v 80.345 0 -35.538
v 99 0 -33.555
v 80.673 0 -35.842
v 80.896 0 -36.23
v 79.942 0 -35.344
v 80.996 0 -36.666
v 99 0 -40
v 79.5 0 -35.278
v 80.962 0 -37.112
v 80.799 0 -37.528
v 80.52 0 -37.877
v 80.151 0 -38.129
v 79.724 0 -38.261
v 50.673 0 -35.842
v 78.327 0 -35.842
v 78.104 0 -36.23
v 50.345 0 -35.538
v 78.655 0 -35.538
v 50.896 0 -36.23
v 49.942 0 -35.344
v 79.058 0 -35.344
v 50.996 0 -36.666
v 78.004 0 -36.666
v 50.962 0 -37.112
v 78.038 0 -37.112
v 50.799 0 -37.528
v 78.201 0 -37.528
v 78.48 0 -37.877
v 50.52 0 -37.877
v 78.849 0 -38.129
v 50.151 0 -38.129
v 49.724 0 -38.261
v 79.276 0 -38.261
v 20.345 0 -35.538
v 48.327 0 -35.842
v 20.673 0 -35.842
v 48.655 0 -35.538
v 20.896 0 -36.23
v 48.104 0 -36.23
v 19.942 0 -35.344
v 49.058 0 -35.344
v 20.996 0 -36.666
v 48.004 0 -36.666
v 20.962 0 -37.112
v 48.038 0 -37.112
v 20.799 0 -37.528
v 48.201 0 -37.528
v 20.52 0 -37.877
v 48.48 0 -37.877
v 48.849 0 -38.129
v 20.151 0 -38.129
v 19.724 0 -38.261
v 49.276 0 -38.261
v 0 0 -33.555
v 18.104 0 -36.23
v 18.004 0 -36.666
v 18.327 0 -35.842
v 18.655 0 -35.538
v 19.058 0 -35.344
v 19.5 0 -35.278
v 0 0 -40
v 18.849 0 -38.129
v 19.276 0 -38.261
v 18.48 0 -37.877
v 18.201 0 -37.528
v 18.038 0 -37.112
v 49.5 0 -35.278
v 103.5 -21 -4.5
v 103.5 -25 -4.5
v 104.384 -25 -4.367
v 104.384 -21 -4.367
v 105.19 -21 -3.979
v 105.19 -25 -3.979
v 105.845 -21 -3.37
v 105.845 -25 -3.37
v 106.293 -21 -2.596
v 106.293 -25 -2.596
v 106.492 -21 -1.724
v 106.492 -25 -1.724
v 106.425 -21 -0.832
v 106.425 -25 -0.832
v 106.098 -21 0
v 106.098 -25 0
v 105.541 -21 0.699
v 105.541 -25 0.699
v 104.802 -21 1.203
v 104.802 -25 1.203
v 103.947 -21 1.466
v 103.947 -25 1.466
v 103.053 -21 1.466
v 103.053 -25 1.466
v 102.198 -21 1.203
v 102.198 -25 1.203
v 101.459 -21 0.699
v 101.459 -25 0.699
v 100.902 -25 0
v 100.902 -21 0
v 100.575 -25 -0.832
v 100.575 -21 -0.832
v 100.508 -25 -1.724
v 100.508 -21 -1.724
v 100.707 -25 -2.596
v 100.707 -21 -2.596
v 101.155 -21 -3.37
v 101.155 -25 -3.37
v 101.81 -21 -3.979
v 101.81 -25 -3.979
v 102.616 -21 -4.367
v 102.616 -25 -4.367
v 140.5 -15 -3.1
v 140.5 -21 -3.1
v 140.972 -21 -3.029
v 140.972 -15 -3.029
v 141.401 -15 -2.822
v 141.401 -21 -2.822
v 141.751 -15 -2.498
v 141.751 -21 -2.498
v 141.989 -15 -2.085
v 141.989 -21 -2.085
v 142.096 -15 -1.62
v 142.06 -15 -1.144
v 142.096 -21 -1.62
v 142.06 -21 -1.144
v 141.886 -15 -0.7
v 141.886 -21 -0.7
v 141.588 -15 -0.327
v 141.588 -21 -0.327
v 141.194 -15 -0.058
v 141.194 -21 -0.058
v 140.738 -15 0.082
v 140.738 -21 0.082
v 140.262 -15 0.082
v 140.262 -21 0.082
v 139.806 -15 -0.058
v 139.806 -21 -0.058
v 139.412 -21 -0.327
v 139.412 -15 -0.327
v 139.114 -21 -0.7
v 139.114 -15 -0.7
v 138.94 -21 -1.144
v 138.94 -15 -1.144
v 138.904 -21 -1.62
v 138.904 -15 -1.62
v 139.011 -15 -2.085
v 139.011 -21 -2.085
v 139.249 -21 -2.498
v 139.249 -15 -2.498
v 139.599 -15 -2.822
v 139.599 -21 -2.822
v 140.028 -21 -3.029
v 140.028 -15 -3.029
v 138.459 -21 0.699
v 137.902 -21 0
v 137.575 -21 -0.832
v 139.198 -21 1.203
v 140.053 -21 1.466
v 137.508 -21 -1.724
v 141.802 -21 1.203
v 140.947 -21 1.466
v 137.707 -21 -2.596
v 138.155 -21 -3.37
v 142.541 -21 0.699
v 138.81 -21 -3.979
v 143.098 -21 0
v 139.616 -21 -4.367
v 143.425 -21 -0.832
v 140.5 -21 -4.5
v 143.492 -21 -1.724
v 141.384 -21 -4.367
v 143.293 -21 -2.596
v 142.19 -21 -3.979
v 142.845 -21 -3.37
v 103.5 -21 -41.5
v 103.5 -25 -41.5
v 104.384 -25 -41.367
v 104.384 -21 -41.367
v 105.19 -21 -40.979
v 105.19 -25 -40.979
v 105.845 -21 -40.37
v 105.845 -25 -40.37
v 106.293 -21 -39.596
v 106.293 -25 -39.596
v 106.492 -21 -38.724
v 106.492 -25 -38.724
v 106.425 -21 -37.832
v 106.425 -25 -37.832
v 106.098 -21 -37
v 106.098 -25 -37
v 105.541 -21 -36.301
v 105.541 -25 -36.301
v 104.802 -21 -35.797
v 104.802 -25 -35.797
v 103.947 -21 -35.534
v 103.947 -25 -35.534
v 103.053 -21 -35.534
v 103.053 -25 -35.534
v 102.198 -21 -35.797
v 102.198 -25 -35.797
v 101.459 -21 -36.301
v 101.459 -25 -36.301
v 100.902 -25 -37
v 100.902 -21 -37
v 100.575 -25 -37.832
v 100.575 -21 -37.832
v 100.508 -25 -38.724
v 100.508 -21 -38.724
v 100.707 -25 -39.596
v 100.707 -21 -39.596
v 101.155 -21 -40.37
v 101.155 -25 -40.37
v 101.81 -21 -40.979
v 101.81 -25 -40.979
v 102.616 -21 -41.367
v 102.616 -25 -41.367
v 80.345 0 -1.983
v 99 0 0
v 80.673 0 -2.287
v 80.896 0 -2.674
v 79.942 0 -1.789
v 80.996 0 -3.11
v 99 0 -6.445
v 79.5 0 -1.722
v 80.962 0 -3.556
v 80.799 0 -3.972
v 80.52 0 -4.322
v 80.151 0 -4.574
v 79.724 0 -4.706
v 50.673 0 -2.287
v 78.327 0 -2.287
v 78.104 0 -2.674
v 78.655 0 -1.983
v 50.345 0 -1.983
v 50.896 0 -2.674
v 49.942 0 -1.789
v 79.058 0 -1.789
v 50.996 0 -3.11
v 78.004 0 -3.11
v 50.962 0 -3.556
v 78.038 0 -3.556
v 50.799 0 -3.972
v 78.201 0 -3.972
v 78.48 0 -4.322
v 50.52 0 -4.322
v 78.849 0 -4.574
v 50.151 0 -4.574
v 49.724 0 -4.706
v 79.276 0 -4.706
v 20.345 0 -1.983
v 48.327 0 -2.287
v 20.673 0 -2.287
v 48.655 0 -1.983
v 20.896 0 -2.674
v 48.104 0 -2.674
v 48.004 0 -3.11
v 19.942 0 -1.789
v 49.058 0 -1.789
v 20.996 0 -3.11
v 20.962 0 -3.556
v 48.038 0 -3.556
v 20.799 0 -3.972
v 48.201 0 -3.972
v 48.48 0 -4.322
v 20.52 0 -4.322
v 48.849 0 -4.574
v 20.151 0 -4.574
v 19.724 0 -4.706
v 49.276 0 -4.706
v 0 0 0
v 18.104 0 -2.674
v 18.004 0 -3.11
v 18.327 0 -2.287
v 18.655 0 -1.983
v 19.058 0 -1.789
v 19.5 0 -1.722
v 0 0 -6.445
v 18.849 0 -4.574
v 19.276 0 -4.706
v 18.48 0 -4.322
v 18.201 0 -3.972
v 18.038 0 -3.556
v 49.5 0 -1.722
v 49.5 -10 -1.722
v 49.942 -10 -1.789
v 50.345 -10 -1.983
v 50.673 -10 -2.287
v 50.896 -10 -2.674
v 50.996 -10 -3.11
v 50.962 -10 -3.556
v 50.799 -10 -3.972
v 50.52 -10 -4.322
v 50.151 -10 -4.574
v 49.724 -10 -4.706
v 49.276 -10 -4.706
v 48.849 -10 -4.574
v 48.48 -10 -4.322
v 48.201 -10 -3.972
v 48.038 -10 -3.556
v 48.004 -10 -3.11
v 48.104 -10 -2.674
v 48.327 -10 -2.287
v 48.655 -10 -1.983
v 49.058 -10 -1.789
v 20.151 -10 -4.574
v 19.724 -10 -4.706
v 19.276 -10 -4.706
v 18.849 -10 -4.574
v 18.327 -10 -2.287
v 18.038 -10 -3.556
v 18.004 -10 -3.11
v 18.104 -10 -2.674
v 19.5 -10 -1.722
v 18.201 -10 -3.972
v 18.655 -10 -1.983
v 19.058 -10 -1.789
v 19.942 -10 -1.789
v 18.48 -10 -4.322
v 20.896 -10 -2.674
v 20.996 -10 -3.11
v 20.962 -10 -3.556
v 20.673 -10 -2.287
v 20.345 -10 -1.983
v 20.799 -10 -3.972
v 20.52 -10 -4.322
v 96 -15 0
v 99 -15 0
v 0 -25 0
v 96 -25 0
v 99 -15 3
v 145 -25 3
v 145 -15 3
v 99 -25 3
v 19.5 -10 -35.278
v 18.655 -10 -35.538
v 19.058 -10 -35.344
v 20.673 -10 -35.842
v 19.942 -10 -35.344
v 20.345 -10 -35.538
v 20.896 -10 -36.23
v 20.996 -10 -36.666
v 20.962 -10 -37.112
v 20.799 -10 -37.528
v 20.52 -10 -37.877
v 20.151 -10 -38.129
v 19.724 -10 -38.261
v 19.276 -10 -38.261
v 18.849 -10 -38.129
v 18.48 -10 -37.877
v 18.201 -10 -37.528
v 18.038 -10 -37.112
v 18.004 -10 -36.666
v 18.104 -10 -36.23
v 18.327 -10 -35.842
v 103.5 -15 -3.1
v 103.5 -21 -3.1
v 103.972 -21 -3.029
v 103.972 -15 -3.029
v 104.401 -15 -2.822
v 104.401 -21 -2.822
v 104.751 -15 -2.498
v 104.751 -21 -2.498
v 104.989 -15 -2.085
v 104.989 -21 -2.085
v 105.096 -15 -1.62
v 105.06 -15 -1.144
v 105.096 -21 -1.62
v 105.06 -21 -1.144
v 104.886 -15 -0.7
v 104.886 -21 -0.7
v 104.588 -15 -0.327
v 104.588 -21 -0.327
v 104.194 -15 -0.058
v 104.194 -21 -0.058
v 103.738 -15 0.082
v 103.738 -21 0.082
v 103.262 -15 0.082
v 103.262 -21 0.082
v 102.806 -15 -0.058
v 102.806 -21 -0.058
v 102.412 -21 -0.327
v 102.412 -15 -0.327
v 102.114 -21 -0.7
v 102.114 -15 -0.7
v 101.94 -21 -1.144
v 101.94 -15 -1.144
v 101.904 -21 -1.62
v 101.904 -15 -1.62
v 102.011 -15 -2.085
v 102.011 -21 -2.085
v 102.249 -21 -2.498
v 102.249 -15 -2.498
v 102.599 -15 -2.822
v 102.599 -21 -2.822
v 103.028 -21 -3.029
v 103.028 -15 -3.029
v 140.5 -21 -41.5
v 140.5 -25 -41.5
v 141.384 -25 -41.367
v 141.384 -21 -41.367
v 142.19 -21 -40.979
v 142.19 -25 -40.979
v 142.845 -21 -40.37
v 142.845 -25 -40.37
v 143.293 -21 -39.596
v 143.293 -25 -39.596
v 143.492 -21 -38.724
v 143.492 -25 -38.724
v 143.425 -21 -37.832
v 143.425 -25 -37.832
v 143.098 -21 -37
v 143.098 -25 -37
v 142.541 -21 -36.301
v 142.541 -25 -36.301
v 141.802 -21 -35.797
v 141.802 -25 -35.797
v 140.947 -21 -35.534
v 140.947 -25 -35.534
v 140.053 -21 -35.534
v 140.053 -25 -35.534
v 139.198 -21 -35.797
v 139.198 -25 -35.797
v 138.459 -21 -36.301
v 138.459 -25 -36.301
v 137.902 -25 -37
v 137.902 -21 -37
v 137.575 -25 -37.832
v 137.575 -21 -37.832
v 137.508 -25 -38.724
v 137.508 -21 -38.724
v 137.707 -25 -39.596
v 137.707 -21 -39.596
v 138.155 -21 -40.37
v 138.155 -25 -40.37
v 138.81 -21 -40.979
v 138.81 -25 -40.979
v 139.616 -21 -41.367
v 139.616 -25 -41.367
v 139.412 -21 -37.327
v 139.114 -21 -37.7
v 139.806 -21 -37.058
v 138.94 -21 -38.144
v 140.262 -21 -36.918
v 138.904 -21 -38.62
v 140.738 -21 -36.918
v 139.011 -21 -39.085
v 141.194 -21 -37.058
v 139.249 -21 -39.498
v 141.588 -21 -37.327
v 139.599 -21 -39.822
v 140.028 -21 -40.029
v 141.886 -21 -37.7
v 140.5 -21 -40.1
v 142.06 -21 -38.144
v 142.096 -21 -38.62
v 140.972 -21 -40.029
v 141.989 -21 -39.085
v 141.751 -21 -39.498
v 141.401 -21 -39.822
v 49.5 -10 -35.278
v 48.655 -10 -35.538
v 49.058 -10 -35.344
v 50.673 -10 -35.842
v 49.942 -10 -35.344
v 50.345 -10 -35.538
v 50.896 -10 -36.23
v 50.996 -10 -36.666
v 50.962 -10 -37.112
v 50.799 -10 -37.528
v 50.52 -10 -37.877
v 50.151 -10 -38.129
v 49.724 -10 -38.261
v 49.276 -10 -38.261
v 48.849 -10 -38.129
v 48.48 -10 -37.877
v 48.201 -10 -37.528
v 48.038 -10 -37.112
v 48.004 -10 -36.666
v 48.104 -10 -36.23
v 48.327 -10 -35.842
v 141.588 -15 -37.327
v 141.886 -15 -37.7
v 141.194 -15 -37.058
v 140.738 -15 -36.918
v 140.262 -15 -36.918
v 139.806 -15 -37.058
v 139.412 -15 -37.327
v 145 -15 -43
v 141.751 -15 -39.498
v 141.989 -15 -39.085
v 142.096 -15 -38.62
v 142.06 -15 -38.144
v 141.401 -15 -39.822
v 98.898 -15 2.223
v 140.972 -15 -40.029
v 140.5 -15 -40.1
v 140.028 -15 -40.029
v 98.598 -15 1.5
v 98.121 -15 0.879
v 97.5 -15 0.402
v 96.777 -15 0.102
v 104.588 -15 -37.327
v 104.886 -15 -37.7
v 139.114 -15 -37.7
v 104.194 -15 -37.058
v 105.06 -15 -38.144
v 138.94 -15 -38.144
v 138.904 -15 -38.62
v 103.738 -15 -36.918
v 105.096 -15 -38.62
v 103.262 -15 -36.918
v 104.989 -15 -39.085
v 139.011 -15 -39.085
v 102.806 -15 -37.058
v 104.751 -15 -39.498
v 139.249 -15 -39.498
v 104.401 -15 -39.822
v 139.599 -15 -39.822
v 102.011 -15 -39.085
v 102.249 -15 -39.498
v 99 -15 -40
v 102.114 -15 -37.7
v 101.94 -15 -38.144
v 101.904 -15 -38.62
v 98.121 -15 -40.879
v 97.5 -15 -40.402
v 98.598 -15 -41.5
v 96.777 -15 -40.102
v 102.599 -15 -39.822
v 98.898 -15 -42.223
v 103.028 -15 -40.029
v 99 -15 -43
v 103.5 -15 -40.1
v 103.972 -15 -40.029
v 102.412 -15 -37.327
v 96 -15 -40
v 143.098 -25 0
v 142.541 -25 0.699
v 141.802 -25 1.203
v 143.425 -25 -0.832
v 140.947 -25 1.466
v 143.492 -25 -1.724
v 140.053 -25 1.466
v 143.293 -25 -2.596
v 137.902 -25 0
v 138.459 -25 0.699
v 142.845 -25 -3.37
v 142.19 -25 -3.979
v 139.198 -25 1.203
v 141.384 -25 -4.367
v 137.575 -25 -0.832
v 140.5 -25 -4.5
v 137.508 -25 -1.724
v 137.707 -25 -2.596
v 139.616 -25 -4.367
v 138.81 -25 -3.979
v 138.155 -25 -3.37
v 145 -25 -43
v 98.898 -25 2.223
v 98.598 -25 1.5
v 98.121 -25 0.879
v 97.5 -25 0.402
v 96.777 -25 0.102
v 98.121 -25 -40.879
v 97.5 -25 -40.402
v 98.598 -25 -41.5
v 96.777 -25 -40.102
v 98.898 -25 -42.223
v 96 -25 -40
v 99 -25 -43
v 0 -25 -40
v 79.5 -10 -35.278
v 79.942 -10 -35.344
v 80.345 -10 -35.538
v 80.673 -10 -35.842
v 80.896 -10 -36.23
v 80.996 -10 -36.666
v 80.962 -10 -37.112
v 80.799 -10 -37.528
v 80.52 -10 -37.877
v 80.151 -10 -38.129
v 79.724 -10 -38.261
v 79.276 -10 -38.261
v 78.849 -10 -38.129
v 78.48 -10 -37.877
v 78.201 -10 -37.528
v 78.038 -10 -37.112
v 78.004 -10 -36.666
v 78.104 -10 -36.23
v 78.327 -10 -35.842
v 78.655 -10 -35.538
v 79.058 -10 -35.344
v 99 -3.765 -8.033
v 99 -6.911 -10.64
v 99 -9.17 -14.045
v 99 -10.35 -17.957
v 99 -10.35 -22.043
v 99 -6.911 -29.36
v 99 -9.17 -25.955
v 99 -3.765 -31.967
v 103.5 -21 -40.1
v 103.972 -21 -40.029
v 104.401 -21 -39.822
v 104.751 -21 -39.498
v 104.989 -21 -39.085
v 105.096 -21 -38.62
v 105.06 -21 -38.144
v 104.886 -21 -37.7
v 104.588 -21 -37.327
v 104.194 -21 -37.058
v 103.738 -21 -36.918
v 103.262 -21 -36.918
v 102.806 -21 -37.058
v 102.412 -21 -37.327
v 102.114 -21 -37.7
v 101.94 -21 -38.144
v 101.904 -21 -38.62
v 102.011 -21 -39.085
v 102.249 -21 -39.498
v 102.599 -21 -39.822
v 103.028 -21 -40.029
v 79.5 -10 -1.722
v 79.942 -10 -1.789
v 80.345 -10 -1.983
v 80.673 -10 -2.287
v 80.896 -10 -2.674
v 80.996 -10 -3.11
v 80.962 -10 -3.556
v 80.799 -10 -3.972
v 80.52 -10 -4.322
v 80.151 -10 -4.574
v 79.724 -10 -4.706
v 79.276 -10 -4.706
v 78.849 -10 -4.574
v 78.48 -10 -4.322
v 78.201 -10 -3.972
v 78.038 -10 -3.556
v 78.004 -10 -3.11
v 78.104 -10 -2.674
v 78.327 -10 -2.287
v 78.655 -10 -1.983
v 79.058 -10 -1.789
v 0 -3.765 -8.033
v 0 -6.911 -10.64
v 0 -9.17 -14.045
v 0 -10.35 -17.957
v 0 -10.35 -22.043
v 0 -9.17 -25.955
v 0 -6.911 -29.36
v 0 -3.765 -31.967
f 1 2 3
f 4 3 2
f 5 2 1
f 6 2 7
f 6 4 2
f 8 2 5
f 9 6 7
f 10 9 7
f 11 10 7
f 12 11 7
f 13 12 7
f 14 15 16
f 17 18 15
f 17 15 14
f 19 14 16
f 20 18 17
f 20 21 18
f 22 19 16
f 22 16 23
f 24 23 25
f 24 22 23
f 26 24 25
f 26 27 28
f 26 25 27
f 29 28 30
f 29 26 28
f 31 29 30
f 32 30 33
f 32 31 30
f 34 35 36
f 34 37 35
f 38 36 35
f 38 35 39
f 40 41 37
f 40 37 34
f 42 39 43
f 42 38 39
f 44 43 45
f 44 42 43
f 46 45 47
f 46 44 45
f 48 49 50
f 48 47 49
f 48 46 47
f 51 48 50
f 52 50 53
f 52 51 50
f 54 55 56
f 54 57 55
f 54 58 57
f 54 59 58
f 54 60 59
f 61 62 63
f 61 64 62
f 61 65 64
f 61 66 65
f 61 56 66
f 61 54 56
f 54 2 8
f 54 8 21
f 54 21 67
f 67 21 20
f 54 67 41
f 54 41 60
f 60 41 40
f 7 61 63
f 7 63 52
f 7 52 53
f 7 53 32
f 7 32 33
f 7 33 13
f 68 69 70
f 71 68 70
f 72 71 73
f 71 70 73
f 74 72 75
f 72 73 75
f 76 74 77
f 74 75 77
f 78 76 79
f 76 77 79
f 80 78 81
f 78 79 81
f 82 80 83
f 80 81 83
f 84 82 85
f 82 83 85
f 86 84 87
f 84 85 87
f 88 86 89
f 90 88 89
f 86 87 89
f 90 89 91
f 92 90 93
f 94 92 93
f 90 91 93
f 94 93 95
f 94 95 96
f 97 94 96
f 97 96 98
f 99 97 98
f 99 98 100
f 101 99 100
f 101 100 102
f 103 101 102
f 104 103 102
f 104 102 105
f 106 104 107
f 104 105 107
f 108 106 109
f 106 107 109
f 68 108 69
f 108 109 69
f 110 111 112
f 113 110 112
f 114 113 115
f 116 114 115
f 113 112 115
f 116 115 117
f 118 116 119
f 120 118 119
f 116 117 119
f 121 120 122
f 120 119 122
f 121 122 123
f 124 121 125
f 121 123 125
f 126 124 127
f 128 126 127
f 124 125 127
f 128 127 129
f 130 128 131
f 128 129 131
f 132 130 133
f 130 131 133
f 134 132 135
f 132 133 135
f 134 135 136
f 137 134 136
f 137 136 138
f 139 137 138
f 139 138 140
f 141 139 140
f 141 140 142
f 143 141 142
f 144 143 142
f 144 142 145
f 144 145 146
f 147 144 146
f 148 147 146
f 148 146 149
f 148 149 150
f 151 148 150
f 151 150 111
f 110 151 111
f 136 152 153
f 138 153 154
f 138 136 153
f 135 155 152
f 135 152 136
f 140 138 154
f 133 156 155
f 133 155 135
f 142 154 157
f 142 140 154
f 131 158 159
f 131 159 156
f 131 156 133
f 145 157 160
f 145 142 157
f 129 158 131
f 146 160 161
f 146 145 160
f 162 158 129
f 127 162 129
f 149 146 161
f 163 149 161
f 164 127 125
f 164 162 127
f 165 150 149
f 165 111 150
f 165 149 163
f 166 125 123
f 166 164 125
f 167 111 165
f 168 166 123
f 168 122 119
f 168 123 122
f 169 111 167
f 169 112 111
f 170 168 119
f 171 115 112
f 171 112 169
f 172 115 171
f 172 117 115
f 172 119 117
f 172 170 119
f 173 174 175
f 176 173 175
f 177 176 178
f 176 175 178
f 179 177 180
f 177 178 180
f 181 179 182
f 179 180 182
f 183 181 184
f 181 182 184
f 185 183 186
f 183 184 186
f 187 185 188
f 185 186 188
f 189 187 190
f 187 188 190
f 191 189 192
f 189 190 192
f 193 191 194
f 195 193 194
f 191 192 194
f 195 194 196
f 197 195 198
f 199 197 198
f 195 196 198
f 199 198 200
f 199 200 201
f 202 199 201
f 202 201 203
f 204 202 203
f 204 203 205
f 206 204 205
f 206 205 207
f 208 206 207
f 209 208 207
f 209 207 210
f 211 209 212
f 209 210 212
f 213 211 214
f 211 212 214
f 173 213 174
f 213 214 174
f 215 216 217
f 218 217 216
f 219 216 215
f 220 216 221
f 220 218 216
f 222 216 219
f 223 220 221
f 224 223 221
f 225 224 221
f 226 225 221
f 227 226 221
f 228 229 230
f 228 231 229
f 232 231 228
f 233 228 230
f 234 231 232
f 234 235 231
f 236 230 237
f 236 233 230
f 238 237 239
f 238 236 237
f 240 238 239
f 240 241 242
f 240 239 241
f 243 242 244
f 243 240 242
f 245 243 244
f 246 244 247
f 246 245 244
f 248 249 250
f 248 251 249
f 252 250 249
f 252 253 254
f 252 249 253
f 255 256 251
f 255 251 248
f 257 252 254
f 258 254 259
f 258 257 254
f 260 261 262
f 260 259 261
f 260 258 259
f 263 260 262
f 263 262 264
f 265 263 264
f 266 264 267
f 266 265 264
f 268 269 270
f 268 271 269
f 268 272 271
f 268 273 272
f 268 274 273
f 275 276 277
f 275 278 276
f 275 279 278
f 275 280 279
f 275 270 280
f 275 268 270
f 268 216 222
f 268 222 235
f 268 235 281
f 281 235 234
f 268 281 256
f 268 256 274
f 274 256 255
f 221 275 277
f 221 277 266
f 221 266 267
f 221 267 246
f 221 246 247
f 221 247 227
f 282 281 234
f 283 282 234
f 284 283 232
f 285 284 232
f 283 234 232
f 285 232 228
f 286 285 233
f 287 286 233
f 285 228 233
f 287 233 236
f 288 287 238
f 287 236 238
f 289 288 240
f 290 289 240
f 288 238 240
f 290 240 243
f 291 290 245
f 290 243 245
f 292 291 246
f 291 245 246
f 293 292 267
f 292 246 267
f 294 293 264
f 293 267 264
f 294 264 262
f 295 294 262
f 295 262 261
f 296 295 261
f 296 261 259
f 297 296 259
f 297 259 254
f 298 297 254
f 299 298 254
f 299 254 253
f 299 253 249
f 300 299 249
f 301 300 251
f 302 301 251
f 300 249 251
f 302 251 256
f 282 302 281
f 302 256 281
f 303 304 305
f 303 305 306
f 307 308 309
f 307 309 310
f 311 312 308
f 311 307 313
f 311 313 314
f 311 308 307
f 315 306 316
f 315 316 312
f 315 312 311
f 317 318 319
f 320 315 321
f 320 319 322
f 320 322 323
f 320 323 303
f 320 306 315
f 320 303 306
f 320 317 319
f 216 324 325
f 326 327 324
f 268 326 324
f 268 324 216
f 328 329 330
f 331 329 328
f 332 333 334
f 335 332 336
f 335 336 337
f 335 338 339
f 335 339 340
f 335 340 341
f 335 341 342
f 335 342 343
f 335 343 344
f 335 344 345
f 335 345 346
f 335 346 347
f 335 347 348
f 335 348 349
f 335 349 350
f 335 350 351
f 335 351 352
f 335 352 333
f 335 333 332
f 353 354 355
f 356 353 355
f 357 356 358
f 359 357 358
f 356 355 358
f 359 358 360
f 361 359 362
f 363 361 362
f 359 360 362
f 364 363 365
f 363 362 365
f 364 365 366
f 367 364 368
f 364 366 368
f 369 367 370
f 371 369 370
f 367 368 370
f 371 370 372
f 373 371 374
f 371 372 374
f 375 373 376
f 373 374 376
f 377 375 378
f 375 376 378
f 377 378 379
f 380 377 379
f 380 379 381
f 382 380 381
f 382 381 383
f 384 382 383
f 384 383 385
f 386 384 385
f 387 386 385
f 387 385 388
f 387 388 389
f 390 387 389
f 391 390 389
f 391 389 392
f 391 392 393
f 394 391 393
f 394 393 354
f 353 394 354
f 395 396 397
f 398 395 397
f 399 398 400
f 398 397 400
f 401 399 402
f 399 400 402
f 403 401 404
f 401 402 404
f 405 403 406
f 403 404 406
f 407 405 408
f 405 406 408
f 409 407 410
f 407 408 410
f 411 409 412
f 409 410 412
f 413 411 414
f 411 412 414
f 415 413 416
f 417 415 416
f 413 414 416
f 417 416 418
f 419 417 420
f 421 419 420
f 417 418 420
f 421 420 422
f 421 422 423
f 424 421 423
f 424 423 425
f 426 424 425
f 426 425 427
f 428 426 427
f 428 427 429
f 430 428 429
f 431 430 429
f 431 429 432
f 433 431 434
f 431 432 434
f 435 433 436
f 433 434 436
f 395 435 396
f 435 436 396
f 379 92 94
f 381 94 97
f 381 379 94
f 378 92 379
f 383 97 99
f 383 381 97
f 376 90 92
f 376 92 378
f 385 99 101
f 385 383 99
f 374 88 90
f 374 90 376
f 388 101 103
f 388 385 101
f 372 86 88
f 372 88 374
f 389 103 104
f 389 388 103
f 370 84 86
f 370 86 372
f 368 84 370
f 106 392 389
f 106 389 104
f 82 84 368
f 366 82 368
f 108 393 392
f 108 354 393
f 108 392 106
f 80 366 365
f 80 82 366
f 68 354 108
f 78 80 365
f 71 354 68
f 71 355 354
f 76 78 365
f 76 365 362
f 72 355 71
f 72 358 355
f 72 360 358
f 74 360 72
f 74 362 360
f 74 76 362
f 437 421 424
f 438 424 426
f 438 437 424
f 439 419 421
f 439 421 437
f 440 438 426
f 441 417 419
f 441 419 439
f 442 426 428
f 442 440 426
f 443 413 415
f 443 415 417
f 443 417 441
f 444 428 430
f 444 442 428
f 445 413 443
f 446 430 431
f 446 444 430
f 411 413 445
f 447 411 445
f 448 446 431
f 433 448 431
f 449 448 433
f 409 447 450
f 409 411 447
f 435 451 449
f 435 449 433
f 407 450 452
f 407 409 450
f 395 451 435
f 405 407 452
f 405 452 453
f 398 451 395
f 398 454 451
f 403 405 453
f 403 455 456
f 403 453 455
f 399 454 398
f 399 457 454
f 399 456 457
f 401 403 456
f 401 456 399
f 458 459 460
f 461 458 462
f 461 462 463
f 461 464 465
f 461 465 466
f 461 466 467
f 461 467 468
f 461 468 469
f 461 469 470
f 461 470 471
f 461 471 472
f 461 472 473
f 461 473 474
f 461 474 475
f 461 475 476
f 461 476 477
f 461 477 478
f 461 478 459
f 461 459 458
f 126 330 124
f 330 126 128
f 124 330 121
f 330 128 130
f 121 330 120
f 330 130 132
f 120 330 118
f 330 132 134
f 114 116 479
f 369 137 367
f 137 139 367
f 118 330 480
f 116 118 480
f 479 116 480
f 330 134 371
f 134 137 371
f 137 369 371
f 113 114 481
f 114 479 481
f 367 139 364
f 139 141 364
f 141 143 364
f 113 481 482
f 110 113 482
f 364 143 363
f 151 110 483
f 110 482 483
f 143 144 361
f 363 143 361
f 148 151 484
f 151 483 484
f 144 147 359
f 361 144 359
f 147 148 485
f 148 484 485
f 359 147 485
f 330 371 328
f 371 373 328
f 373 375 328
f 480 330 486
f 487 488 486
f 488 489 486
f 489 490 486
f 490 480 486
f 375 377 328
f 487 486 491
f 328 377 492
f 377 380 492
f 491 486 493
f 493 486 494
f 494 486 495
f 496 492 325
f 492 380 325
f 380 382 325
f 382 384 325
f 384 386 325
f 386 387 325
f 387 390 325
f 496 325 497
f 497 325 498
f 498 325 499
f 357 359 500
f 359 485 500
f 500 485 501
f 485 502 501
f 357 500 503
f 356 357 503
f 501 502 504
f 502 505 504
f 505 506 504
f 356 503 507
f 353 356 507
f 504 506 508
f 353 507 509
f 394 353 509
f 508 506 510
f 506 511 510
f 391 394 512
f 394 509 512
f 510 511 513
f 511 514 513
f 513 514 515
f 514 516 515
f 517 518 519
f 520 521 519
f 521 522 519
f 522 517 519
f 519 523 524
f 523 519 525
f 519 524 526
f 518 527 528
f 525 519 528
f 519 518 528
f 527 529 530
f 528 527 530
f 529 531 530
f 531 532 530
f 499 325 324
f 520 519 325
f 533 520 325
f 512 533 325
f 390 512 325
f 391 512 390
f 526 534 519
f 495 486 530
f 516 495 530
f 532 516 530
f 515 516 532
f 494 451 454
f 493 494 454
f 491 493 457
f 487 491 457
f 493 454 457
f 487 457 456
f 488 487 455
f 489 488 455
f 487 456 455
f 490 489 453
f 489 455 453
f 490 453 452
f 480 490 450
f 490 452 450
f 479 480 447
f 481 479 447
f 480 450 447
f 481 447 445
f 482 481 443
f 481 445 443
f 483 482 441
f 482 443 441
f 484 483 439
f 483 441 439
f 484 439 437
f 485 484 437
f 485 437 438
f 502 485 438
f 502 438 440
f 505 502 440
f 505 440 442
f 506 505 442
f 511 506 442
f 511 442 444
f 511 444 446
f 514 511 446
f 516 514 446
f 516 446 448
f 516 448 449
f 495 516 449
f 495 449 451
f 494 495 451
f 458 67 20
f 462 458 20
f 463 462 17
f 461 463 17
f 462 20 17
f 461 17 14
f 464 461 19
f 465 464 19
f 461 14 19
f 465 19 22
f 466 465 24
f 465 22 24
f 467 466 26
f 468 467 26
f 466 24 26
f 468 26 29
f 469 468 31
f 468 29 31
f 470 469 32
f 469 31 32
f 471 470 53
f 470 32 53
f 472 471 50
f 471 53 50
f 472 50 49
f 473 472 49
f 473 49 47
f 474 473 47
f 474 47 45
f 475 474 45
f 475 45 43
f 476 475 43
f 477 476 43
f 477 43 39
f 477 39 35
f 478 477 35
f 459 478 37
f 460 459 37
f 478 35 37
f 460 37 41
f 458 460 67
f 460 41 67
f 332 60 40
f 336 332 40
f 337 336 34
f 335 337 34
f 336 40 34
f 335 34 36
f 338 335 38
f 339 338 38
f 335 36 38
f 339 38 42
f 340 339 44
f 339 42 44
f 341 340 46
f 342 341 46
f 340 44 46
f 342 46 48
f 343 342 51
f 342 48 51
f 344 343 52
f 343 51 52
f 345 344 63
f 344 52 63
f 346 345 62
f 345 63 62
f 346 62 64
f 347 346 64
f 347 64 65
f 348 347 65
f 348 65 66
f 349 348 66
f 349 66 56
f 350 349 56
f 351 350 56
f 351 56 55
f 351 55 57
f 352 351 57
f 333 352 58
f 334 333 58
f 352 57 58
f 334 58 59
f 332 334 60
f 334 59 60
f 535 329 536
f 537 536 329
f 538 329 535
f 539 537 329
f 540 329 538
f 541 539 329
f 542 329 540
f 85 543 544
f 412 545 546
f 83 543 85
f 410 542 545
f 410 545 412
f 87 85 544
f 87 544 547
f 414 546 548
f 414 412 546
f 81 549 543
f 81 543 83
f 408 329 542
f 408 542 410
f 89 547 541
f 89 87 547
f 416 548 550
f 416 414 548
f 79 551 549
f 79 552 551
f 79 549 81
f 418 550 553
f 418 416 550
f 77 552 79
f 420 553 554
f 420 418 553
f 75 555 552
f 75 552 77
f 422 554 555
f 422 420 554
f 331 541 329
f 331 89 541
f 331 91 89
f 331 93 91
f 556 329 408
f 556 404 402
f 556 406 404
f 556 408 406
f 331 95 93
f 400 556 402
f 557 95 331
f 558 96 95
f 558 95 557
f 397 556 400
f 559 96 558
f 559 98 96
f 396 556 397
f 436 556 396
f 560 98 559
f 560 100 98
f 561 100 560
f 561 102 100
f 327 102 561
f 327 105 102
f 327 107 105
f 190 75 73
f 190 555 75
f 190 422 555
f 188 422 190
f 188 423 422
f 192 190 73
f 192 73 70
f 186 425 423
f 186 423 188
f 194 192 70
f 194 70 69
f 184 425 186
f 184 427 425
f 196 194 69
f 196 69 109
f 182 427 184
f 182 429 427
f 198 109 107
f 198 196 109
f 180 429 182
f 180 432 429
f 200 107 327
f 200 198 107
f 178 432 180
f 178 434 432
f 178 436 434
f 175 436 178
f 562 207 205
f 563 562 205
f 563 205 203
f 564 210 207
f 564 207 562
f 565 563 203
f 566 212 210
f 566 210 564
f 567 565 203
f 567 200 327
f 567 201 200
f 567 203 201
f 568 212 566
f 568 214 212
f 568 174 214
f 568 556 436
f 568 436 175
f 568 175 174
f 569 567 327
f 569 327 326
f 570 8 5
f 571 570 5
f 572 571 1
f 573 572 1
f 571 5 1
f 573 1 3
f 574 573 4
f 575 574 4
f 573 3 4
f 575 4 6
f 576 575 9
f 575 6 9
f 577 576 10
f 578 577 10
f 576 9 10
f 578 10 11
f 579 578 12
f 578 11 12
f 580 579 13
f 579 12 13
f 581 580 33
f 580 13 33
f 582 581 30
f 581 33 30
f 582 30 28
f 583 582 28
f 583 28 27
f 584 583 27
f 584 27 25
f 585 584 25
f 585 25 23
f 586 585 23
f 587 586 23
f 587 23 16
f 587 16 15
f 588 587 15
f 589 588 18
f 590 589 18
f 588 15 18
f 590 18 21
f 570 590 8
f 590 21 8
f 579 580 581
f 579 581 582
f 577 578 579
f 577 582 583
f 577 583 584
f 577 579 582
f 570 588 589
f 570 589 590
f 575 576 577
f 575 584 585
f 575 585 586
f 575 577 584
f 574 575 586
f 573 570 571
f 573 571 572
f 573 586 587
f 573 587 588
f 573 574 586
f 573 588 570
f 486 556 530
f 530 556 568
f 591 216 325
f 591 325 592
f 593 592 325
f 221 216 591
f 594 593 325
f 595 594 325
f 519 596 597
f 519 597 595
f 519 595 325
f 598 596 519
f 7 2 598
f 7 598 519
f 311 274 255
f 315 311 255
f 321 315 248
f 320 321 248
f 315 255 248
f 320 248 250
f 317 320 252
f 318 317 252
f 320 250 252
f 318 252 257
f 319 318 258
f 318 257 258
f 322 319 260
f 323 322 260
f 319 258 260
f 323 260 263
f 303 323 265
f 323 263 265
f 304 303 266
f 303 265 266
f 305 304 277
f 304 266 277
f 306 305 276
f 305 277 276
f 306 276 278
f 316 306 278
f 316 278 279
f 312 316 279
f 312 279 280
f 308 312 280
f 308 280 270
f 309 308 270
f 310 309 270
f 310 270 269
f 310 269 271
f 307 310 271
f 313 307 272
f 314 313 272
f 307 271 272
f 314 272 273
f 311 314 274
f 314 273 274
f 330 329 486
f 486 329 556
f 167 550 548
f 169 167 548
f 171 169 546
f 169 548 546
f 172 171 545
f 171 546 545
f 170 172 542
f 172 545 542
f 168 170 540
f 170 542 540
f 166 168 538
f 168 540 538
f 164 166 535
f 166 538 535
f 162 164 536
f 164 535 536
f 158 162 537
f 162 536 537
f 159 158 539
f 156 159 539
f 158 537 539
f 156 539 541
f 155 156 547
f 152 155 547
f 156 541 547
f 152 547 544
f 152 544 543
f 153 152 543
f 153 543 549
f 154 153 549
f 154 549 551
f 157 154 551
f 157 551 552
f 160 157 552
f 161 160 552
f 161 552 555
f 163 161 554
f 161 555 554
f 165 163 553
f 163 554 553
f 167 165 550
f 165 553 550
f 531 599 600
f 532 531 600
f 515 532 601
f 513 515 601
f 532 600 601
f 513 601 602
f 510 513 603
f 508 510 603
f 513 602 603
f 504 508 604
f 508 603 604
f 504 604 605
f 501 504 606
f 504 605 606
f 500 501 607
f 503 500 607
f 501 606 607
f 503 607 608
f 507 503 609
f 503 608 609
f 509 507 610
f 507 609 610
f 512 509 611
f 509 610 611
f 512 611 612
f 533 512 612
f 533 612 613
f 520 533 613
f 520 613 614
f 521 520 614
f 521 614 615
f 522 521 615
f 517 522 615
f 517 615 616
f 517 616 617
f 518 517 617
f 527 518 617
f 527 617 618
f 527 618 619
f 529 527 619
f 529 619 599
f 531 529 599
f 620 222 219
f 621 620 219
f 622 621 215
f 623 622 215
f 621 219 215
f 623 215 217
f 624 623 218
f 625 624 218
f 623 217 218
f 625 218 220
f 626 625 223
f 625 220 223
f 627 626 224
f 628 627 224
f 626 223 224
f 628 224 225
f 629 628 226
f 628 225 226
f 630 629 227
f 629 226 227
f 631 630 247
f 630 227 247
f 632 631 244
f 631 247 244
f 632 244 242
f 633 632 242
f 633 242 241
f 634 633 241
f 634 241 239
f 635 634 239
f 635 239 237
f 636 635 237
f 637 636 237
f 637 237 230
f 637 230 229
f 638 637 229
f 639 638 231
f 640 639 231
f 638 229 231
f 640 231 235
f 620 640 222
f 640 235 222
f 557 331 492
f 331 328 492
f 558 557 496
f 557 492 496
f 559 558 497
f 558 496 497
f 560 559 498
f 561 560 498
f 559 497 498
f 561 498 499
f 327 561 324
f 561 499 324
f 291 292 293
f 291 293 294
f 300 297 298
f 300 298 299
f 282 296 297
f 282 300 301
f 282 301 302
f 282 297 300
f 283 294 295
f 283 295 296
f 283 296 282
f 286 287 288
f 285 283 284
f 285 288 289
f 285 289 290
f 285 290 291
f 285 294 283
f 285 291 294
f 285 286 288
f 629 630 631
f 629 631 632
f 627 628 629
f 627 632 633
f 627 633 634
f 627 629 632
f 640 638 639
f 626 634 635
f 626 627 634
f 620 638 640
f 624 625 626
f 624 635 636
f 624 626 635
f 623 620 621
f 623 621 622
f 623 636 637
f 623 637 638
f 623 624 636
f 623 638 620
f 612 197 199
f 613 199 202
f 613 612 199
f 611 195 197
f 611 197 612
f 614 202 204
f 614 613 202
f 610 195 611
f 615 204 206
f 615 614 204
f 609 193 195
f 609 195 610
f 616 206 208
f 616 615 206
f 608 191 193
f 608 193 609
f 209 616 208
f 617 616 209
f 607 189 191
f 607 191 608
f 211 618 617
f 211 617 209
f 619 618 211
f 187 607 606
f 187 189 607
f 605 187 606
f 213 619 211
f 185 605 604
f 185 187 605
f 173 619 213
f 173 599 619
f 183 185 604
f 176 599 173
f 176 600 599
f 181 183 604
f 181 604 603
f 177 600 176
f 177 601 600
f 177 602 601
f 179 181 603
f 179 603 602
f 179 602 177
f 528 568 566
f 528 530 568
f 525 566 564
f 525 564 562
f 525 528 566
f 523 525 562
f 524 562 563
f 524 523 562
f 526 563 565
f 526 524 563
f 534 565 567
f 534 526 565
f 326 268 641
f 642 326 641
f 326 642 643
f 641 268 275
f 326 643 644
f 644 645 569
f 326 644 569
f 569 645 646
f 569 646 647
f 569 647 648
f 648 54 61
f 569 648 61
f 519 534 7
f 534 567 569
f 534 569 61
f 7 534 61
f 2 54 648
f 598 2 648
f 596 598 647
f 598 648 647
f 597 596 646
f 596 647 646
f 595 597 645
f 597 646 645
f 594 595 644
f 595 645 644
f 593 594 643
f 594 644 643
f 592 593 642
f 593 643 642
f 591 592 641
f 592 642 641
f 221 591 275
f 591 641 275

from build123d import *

# Parameters (mm, degrees)
SKETCH_1_W          = 40
SKETCH_1_H          = 25
EXTRUDE_1_DEPTH     = 99
SKETCH_2_R          = 14
CUT_EXTRUDE_1_DEPTH = 110.66312051
SKETCH_3_W          = 46
SKETCH_3_H          = 46
EXTRUDE_2_DEPTH     = 10
SKETCH_4_R          = 1.6
CUT_EXTRUDE_2_DEPTH = 10
SKETCH_5_R          = 3
CUT_EXTRUDE_3_DEPTH = 4
FILLET_1_R          = 3
SKETCH_6_R          = 1.5
CUT_EXTRUDE_4_DEPTH = 10


with BuildPart() as part:
    # 草图1 → 凸台-拉伸1 (new body)
    with BuildSketch(Plane(origin=(0, 0, 0), x_dir=(0, 0, -1), z_dir=(1, 0, 0))):
        with Locations((20, -12.5)):
            Rectangle(SKETCH_1_W, SKETCH_1_H)
    extrude(amount=EXTRUDE_1_DEPTH)

    # 草图2 → 切除-拉伸1 (cut, through all)
    with BuildSketch(Plane.ZY):
        with Locations((-20, 3.5)):
            Circle(SKETCH_2_R)
    extrude(amount=-CUT_EXTRUDE_1_DEPTH, mode=Mode.SUBTRACT)

    # 草图3 → 凸台-拉伸2 (add)
    with BuildSketch(Plane(origin=(0, -25, 0), x_dir=(-1, 0, 0), z_dir=(0, -1, 0))):
        with Locations((-122, 20)):
            Rectangle(SKETCH_3_W, SKETCH_3_H)
    extrude(amount=-EXTRUDE_2_DEPTH)

    # 草图4 → 切除-拉伸2 (cut)
    with BuildSketch(Plane(origin=(0, -25, 0), x_dir=(-1, 0, 0), z_dir=(0, -1, 0))):
        with Locations(Location((-103.5, 1.5, 0), (0, 0, 90))):
            Circle(SKETCH_4_R)
        with Locations(Location((-140.5, 1.5, 0), (0, 0, 90))):
            Circle(SKETCH_4_R)
        with Locations(Location((-103.5, 38.5, 0), (0, 0, 90))):
            Circle(SKETCH_4_R)
        with Locations(Location((-140.5, 38.5, 0), (0, 0, 90))):
            Circle(SKETCH_4_R)
    extrude(amount=-CUT_EXTRUDE_2_DEPTH, mode=Mode.SUBTRACT)

    # 草图5 → 切除-拉伸3 (cut)
    with BuildSketch(Plane(origin=(0, -25, 0), x_dir=(-1, 0, 0), z_dir=(0, -1, 0))):
        with Locations(Location((-103.5, 1.5, 0), (0, 0, 90))):
            Circle(SKETCH_5_R)
        with Locations(Location((-103.5, 38.5, 0), (0, 0, 90))):
            Circle(SKETCH_5_R)
        with Locations(Location((-140.5, 38.5, 0), (0, 0, 90))):
            Circle(SKETCH_5_R)
        with Locations(Location((-140.5, 1.5, 0), (0, 0, 90))):
            Circle(SKETCH_5_R)
    extrude(amount=-CUT_EXTRUDE_3_DEPTH, mode=Mode.SUBTRACT)

    # 圆角1
    fillet_1_edges = [part.edges().sort_by_distance(p)[0] for p in [
        (99, -20, -40),
        (99, -20, 0),
    ]]
    fillet(fillet_1_edges, radius=FILLET_1_R - 0.0001)  # a hair under: the kernel refuses the full size

    # 草图6 → 切除-拉伸4 (cut)
    with BuildSketch(Plane(origin=(0, 0, 0), x_dir=(1, 0, 0), z_dir=(0, 1, 0))):
        with Locations(Location((49.5, 36.777720856, 0), (0, 0, 270))):
            Circle(SKETCH_6_R)
        with Locations(Location((49.5, 3.222279144, 0), (0, 0, 270))):
            Circle(SKETCH_6_R)
        with Locations(Location((19.5, 36.777720856, 0), (0, 0, 270))):
            Circle(SKETCH_6_R)
        with Locations(Location((19.5, 3.222279144, 0), (0, 0, 270))):
            Circle(SKETCH_6_R)
        with Locations(Location((79.5, 36.777720856, 0), (0, 0, 270))):
            Circle(SKETCH_6_R)
        with Locations(Location((79.5, 3.222279144, 0), (0, 0, 270))):
            Circle(SKETCH_6_R)
    extrude(amount=-CUT_EXTRUDE_4_DEPTH, mode=Mode.SUBTRACT)


solid = part.part
